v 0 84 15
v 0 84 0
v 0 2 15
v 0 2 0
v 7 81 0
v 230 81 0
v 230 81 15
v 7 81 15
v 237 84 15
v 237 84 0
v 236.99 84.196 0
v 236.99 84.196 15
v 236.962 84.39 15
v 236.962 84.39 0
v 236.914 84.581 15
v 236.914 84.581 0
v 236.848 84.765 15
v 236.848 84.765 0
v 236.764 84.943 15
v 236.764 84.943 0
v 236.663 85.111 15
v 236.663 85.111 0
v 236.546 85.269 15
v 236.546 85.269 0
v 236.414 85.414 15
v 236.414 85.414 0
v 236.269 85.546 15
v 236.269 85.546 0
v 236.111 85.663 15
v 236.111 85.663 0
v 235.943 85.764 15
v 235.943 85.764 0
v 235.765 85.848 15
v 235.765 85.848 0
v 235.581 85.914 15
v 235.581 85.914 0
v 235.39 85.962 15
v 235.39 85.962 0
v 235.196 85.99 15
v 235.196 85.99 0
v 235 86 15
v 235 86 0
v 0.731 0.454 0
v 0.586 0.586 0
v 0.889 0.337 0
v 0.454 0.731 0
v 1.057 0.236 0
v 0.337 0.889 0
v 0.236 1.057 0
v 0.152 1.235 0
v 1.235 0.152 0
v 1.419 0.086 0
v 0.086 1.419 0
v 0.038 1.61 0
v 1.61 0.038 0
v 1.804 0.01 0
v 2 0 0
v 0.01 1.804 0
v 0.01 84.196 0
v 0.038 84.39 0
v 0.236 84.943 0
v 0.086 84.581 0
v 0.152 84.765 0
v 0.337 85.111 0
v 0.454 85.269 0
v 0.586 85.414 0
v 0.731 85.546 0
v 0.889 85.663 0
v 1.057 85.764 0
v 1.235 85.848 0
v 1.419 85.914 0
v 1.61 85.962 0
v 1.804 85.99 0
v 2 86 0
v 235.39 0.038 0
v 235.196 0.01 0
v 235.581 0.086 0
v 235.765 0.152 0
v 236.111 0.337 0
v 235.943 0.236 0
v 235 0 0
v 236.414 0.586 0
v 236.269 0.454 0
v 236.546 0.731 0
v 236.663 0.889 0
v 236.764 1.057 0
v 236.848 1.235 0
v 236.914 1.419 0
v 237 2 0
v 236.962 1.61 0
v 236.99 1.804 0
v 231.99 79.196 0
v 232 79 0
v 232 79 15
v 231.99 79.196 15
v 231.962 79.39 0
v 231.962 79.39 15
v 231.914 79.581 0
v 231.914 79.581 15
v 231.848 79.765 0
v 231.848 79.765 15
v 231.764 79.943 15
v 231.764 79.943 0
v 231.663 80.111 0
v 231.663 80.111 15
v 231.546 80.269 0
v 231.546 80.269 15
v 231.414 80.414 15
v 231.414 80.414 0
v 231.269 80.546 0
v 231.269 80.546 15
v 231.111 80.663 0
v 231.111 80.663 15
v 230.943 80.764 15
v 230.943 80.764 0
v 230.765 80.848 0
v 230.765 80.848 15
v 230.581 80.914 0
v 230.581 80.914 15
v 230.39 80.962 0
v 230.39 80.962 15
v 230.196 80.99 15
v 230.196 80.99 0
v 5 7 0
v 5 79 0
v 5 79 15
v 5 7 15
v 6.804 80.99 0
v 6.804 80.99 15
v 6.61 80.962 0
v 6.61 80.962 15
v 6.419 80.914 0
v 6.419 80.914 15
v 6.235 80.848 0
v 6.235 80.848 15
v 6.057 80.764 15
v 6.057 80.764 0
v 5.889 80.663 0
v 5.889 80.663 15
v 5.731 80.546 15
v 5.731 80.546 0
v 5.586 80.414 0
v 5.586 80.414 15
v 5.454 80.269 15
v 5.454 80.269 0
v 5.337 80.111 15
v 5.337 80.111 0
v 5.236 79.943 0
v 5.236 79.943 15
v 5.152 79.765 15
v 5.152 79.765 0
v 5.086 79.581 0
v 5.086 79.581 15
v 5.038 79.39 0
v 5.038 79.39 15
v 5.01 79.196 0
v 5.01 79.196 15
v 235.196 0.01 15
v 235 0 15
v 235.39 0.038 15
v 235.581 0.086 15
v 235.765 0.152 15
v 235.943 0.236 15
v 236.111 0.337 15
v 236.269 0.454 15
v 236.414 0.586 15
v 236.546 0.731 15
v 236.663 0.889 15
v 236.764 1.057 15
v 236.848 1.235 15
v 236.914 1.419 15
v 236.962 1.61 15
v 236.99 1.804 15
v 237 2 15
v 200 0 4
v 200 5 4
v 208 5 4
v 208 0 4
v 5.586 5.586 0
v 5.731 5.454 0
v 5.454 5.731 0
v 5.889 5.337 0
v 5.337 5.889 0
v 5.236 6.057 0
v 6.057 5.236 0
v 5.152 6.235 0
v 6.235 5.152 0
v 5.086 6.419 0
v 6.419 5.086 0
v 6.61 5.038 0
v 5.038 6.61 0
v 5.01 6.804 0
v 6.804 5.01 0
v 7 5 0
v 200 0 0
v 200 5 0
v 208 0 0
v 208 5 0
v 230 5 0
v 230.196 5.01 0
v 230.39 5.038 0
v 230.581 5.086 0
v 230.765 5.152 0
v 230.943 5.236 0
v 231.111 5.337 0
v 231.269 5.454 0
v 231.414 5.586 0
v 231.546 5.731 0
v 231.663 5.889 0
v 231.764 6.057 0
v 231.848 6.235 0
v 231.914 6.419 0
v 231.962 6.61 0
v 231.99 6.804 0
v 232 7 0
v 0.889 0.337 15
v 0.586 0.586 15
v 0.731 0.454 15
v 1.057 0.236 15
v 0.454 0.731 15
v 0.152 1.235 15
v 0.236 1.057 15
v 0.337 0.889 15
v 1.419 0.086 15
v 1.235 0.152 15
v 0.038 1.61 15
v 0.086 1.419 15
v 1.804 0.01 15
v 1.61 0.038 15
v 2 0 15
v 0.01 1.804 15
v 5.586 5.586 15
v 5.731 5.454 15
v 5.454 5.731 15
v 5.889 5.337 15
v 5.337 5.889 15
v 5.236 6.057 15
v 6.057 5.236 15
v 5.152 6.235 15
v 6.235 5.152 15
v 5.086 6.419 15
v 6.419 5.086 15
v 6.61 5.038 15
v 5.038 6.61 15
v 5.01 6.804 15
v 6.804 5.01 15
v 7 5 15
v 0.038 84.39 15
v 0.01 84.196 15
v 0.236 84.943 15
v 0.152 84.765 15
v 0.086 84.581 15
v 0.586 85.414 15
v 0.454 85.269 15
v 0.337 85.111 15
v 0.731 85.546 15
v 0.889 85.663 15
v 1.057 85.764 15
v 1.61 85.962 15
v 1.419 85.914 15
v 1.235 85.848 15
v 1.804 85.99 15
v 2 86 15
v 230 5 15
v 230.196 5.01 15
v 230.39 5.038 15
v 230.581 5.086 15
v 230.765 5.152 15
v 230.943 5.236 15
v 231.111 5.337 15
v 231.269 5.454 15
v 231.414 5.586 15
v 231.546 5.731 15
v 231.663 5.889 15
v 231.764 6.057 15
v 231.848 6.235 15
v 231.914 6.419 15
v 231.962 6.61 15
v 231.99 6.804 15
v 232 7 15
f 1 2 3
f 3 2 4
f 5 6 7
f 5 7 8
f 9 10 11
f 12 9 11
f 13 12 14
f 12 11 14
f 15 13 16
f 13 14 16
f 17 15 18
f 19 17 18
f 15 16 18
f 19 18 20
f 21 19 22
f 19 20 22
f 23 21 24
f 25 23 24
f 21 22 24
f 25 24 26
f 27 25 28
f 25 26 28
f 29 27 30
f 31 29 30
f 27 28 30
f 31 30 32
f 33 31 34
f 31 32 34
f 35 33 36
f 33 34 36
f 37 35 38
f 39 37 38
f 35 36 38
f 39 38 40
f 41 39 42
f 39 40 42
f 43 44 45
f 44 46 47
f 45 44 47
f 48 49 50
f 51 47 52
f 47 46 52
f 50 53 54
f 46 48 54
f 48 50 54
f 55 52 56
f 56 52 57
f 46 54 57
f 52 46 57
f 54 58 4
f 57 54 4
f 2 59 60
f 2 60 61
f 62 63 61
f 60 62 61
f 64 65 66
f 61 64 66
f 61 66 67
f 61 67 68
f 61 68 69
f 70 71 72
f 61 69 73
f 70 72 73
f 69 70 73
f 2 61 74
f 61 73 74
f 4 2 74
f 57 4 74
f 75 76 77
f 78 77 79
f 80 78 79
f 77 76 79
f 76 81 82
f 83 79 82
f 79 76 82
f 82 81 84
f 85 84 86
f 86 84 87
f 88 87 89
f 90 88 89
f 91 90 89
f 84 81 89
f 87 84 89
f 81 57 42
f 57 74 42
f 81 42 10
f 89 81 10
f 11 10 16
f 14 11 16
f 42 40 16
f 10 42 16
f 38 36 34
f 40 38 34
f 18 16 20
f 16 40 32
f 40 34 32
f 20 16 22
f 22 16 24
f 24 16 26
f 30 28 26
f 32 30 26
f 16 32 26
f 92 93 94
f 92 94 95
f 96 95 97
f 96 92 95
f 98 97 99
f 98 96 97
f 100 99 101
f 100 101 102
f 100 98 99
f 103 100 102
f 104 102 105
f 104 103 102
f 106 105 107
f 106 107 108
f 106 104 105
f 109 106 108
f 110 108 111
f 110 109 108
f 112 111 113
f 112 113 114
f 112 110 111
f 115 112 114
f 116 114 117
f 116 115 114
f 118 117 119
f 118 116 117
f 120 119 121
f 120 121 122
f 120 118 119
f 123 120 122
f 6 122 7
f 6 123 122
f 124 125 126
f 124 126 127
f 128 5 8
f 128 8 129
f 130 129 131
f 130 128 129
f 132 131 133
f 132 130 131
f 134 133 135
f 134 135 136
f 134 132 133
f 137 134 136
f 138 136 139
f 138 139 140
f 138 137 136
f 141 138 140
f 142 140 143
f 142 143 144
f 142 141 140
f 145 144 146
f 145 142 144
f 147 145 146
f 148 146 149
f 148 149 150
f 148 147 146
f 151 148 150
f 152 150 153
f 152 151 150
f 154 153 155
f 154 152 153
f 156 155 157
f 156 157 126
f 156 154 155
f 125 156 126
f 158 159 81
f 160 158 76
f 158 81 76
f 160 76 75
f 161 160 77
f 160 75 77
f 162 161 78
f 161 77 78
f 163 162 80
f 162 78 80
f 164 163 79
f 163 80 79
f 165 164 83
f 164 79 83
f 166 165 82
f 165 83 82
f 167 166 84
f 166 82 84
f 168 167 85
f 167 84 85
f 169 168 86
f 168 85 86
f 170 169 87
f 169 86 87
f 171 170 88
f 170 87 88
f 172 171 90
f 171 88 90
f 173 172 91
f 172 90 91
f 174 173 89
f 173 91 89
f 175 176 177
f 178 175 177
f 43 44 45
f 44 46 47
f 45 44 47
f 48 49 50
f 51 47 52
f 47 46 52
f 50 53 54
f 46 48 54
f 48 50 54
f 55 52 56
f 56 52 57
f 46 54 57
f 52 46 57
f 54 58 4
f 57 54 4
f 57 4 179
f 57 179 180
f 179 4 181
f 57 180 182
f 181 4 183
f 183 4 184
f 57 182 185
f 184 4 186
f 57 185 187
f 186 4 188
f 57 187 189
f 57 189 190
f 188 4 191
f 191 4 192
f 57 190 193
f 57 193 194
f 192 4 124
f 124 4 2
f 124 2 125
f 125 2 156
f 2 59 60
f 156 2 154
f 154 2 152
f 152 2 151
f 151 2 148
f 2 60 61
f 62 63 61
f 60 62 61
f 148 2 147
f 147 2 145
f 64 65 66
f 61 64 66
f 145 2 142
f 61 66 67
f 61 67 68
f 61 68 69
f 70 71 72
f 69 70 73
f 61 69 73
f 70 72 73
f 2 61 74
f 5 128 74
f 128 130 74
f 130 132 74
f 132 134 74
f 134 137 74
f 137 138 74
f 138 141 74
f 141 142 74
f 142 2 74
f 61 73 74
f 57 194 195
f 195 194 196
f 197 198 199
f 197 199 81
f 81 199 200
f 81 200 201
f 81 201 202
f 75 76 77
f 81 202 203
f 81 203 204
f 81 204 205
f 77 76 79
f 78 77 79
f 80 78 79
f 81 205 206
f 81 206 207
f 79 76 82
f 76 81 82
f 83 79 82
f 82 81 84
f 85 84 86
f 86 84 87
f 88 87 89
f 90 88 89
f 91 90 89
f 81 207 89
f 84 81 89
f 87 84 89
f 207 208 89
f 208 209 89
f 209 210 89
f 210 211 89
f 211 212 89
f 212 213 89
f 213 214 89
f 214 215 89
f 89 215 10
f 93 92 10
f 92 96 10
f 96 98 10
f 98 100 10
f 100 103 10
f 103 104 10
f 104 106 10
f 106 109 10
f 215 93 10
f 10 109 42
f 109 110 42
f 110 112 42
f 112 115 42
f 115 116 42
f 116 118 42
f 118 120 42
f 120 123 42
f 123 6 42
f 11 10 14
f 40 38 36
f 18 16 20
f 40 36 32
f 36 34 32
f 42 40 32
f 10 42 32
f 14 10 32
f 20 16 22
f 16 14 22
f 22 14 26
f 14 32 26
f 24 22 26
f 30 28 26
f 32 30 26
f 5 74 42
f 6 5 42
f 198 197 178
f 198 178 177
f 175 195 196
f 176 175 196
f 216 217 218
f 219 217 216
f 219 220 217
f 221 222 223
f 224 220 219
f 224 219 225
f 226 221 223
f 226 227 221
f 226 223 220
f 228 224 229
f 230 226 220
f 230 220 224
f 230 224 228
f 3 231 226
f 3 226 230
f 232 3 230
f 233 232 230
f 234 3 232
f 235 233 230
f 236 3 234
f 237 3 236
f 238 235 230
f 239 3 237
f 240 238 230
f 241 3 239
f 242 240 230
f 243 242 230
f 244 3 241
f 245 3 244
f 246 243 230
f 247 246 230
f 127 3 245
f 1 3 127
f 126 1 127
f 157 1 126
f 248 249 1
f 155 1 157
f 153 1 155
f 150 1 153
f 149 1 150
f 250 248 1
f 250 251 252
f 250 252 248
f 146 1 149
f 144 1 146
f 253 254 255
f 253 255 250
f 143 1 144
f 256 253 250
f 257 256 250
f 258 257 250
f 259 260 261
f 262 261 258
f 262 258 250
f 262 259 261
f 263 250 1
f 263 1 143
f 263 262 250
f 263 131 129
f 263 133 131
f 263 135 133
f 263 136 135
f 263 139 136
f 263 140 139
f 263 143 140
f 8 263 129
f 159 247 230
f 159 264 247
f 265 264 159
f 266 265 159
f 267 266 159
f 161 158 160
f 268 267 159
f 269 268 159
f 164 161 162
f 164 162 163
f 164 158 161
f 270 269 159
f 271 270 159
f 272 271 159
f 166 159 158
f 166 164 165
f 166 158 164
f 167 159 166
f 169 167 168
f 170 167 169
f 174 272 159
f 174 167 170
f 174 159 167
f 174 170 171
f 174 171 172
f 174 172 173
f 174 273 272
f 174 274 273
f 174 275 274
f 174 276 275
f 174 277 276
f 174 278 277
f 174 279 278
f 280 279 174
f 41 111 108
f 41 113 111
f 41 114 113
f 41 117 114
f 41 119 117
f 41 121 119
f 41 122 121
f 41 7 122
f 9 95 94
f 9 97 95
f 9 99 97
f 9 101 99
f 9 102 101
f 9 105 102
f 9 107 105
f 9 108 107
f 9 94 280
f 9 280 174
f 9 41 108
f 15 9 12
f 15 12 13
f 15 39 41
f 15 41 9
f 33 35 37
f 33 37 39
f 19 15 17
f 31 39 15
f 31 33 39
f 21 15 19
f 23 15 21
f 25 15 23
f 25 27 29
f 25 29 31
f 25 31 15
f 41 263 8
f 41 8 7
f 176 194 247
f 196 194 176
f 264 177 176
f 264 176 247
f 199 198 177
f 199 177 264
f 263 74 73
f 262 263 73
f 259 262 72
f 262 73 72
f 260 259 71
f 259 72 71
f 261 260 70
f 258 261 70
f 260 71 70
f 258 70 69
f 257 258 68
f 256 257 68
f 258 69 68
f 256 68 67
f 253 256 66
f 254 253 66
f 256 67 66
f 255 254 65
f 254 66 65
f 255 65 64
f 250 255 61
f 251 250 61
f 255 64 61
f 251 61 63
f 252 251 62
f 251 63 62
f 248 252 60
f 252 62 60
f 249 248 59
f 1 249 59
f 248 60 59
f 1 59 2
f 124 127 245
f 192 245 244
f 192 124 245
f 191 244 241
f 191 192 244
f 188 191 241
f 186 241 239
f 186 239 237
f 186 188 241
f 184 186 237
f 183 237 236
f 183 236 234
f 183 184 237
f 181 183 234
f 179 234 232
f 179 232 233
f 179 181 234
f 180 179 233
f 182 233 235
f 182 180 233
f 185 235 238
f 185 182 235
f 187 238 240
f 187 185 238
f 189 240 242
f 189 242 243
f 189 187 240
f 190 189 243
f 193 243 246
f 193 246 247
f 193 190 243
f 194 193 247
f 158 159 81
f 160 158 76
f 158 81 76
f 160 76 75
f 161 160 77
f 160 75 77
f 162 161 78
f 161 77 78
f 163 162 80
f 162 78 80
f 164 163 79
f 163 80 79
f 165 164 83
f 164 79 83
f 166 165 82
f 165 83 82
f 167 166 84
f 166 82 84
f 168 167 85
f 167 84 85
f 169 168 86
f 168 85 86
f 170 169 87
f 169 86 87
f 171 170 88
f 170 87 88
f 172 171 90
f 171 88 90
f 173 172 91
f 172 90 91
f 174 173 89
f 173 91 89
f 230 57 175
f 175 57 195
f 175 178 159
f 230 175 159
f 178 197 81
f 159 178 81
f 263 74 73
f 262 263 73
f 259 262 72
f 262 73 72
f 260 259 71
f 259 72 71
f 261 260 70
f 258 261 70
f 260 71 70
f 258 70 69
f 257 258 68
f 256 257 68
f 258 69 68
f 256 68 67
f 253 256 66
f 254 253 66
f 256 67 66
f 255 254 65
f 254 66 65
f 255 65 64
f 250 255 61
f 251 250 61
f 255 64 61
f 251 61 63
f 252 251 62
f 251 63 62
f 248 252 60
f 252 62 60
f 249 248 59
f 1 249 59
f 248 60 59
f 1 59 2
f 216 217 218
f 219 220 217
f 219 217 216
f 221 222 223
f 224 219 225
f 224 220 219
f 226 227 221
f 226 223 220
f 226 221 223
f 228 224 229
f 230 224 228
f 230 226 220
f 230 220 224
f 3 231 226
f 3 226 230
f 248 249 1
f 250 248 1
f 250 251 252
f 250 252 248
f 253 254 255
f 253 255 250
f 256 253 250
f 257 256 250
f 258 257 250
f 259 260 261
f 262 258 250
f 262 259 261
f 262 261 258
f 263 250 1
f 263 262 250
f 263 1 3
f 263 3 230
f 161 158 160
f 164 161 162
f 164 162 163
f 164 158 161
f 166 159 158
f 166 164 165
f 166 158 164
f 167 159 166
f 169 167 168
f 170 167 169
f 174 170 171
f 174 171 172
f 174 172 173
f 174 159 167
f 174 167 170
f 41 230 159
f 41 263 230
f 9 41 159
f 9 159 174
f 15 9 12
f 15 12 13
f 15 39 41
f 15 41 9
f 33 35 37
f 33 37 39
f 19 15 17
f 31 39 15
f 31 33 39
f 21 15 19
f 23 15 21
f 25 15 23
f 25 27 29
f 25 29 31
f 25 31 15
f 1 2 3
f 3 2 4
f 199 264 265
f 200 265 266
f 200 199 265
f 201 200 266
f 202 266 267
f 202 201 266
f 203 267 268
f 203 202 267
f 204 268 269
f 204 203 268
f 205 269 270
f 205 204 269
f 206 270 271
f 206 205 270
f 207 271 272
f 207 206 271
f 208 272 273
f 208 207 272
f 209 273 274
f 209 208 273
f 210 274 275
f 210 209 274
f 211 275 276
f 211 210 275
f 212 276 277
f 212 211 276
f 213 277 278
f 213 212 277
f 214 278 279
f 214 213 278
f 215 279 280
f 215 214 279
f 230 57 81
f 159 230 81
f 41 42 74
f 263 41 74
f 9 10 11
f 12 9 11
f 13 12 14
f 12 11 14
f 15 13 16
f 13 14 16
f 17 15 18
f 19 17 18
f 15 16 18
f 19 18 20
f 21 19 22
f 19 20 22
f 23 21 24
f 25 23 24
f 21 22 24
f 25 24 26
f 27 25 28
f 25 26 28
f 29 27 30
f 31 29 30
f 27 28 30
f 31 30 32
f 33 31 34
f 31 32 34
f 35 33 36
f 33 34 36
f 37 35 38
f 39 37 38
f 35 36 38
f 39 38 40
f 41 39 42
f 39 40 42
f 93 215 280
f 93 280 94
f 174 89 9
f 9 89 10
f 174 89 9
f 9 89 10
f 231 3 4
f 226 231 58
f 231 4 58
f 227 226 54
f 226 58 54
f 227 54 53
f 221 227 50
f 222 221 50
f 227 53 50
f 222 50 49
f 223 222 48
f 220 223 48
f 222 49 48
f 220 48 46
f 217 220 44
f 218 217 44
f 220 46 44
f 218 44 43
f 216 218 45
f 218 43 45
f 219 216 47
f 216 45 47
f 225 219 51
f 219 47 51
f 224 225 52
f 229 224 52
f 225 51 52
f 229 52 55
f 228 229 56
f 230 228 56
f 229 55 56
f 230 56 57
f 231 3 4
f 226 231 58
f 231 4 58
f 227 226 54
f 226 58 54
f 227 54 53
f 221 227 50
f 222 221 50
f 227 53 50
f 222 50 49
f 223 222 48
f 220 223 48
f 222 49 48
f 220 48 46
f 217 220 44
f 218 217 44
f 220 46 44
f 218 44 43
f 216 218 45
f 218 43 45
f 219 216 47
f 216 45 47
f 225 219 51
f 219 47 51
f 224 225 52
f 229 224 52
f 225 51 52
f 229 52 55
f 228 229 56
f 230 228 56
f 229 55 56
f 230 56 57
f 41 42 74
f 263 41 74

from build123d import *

# Parameters (mm, degrees)
EXTRUDE002_DEPTH = 15
BOX_W            = 8
BOX_H            = 8
BOX_DEPTH        = 4
EXTRUDE_DEPTH    = 15
EXTRUDE001_DEPTH = 15


with BuildPart() as extrude002:
    # Rectangle001 → Extrude002 (new body)
    with BuildSketch(Plane.XY):
        with BuildLine():
            Line((2, 0), (235, 0))
            ThreePointArc((235, 0), (236.414214, 0.585786), (237, 2))
            Line((237, 2), (237, 84))
            ThreePointArc((237, 84), (236.414214, 85.414214), (235, 86))
            Line((235, 86), (2, 86))
            ThreePointArc((2, 86), (0.585786, 85.414214), (0, 84))
            Line((0, 84), (0, 2))
            ThreePointArc((0, 2), (0.585786, 0.585786), (2, 0))
        make_face()
    extrude(amount=EXTRUDE002_DEPTH)


with BuildPart() as cube:
    # Box → Box (new body)
    with BuildSketch(Plane(origin=(200, 0, 0), x_dir=(1, 0, 0), z_dir=(0, 0, 1))):
        with Locations((4, 4)):
            Rectangle(BOX_W, BOX_H)
    extrude(amount=BOX_DEPTH)


with BuildPart() as extrude_body:
    # Rectangle → Extrude (new body)
    with BuildSketch(Plane(origin=(5, 5, 0), x_dir=(1, 0, 0), z_dir=(0, 0, 1))):
        with BuildLine():
            Line((2, 0), (225, 0))
            ThreePointArc((225, 0), (226.414214, 0.585786), (227, 2))
            Line((227, 2), (227, 74))
            ThreePointArc((227, 74), (226.414214, 75.414214), (225, 76))
            Line((225, 76), (2, 76))
            ThreePointArc((2, 76), (0.585786, 75.414214), (0, 74))
            Line((0, 74), (0, 2))
            ThreePointArc((0, 2), (0.585786, 0.585786), (2, 0))
        make_face()
    extrude(amount=EXTRUDE_DEPTH)


with BuildPart() as cut001:
    # Rectangle001 → Extrude001 (new body)
    with BuildSketch(Plane.XY):
        with BuildLine():
            Line((2, 0), (235, 0))
            ThreePointArc((235, 0), (236.414214, 0.585786), (237, 2))
            Line((237, 2), (237, 84))
            ThreePointArc((237, 84), (236.414214, 85.414214), (235, 86))
            Line((235, 86), (2, 86))
            ThreePointArc((2, 86), (0.585786, 85.414214), (0, 84))
            Line((0, 84), (0, 2))
            ThreePointArc((0, 2), (0.585786, 0.585786), (2, 0))
        make_face()
    extrude(amount=EXTRUDE001_DEPTH)

    # Cut: cut Extrude body
    add(extrude_body.part, mode=Mode.SUBTRACT)

    # Cut001: cut Cube
    add(cube.part, mode=Mode.SUBTRACT)


solid = Compound([extrude002.part, cut001.part])
